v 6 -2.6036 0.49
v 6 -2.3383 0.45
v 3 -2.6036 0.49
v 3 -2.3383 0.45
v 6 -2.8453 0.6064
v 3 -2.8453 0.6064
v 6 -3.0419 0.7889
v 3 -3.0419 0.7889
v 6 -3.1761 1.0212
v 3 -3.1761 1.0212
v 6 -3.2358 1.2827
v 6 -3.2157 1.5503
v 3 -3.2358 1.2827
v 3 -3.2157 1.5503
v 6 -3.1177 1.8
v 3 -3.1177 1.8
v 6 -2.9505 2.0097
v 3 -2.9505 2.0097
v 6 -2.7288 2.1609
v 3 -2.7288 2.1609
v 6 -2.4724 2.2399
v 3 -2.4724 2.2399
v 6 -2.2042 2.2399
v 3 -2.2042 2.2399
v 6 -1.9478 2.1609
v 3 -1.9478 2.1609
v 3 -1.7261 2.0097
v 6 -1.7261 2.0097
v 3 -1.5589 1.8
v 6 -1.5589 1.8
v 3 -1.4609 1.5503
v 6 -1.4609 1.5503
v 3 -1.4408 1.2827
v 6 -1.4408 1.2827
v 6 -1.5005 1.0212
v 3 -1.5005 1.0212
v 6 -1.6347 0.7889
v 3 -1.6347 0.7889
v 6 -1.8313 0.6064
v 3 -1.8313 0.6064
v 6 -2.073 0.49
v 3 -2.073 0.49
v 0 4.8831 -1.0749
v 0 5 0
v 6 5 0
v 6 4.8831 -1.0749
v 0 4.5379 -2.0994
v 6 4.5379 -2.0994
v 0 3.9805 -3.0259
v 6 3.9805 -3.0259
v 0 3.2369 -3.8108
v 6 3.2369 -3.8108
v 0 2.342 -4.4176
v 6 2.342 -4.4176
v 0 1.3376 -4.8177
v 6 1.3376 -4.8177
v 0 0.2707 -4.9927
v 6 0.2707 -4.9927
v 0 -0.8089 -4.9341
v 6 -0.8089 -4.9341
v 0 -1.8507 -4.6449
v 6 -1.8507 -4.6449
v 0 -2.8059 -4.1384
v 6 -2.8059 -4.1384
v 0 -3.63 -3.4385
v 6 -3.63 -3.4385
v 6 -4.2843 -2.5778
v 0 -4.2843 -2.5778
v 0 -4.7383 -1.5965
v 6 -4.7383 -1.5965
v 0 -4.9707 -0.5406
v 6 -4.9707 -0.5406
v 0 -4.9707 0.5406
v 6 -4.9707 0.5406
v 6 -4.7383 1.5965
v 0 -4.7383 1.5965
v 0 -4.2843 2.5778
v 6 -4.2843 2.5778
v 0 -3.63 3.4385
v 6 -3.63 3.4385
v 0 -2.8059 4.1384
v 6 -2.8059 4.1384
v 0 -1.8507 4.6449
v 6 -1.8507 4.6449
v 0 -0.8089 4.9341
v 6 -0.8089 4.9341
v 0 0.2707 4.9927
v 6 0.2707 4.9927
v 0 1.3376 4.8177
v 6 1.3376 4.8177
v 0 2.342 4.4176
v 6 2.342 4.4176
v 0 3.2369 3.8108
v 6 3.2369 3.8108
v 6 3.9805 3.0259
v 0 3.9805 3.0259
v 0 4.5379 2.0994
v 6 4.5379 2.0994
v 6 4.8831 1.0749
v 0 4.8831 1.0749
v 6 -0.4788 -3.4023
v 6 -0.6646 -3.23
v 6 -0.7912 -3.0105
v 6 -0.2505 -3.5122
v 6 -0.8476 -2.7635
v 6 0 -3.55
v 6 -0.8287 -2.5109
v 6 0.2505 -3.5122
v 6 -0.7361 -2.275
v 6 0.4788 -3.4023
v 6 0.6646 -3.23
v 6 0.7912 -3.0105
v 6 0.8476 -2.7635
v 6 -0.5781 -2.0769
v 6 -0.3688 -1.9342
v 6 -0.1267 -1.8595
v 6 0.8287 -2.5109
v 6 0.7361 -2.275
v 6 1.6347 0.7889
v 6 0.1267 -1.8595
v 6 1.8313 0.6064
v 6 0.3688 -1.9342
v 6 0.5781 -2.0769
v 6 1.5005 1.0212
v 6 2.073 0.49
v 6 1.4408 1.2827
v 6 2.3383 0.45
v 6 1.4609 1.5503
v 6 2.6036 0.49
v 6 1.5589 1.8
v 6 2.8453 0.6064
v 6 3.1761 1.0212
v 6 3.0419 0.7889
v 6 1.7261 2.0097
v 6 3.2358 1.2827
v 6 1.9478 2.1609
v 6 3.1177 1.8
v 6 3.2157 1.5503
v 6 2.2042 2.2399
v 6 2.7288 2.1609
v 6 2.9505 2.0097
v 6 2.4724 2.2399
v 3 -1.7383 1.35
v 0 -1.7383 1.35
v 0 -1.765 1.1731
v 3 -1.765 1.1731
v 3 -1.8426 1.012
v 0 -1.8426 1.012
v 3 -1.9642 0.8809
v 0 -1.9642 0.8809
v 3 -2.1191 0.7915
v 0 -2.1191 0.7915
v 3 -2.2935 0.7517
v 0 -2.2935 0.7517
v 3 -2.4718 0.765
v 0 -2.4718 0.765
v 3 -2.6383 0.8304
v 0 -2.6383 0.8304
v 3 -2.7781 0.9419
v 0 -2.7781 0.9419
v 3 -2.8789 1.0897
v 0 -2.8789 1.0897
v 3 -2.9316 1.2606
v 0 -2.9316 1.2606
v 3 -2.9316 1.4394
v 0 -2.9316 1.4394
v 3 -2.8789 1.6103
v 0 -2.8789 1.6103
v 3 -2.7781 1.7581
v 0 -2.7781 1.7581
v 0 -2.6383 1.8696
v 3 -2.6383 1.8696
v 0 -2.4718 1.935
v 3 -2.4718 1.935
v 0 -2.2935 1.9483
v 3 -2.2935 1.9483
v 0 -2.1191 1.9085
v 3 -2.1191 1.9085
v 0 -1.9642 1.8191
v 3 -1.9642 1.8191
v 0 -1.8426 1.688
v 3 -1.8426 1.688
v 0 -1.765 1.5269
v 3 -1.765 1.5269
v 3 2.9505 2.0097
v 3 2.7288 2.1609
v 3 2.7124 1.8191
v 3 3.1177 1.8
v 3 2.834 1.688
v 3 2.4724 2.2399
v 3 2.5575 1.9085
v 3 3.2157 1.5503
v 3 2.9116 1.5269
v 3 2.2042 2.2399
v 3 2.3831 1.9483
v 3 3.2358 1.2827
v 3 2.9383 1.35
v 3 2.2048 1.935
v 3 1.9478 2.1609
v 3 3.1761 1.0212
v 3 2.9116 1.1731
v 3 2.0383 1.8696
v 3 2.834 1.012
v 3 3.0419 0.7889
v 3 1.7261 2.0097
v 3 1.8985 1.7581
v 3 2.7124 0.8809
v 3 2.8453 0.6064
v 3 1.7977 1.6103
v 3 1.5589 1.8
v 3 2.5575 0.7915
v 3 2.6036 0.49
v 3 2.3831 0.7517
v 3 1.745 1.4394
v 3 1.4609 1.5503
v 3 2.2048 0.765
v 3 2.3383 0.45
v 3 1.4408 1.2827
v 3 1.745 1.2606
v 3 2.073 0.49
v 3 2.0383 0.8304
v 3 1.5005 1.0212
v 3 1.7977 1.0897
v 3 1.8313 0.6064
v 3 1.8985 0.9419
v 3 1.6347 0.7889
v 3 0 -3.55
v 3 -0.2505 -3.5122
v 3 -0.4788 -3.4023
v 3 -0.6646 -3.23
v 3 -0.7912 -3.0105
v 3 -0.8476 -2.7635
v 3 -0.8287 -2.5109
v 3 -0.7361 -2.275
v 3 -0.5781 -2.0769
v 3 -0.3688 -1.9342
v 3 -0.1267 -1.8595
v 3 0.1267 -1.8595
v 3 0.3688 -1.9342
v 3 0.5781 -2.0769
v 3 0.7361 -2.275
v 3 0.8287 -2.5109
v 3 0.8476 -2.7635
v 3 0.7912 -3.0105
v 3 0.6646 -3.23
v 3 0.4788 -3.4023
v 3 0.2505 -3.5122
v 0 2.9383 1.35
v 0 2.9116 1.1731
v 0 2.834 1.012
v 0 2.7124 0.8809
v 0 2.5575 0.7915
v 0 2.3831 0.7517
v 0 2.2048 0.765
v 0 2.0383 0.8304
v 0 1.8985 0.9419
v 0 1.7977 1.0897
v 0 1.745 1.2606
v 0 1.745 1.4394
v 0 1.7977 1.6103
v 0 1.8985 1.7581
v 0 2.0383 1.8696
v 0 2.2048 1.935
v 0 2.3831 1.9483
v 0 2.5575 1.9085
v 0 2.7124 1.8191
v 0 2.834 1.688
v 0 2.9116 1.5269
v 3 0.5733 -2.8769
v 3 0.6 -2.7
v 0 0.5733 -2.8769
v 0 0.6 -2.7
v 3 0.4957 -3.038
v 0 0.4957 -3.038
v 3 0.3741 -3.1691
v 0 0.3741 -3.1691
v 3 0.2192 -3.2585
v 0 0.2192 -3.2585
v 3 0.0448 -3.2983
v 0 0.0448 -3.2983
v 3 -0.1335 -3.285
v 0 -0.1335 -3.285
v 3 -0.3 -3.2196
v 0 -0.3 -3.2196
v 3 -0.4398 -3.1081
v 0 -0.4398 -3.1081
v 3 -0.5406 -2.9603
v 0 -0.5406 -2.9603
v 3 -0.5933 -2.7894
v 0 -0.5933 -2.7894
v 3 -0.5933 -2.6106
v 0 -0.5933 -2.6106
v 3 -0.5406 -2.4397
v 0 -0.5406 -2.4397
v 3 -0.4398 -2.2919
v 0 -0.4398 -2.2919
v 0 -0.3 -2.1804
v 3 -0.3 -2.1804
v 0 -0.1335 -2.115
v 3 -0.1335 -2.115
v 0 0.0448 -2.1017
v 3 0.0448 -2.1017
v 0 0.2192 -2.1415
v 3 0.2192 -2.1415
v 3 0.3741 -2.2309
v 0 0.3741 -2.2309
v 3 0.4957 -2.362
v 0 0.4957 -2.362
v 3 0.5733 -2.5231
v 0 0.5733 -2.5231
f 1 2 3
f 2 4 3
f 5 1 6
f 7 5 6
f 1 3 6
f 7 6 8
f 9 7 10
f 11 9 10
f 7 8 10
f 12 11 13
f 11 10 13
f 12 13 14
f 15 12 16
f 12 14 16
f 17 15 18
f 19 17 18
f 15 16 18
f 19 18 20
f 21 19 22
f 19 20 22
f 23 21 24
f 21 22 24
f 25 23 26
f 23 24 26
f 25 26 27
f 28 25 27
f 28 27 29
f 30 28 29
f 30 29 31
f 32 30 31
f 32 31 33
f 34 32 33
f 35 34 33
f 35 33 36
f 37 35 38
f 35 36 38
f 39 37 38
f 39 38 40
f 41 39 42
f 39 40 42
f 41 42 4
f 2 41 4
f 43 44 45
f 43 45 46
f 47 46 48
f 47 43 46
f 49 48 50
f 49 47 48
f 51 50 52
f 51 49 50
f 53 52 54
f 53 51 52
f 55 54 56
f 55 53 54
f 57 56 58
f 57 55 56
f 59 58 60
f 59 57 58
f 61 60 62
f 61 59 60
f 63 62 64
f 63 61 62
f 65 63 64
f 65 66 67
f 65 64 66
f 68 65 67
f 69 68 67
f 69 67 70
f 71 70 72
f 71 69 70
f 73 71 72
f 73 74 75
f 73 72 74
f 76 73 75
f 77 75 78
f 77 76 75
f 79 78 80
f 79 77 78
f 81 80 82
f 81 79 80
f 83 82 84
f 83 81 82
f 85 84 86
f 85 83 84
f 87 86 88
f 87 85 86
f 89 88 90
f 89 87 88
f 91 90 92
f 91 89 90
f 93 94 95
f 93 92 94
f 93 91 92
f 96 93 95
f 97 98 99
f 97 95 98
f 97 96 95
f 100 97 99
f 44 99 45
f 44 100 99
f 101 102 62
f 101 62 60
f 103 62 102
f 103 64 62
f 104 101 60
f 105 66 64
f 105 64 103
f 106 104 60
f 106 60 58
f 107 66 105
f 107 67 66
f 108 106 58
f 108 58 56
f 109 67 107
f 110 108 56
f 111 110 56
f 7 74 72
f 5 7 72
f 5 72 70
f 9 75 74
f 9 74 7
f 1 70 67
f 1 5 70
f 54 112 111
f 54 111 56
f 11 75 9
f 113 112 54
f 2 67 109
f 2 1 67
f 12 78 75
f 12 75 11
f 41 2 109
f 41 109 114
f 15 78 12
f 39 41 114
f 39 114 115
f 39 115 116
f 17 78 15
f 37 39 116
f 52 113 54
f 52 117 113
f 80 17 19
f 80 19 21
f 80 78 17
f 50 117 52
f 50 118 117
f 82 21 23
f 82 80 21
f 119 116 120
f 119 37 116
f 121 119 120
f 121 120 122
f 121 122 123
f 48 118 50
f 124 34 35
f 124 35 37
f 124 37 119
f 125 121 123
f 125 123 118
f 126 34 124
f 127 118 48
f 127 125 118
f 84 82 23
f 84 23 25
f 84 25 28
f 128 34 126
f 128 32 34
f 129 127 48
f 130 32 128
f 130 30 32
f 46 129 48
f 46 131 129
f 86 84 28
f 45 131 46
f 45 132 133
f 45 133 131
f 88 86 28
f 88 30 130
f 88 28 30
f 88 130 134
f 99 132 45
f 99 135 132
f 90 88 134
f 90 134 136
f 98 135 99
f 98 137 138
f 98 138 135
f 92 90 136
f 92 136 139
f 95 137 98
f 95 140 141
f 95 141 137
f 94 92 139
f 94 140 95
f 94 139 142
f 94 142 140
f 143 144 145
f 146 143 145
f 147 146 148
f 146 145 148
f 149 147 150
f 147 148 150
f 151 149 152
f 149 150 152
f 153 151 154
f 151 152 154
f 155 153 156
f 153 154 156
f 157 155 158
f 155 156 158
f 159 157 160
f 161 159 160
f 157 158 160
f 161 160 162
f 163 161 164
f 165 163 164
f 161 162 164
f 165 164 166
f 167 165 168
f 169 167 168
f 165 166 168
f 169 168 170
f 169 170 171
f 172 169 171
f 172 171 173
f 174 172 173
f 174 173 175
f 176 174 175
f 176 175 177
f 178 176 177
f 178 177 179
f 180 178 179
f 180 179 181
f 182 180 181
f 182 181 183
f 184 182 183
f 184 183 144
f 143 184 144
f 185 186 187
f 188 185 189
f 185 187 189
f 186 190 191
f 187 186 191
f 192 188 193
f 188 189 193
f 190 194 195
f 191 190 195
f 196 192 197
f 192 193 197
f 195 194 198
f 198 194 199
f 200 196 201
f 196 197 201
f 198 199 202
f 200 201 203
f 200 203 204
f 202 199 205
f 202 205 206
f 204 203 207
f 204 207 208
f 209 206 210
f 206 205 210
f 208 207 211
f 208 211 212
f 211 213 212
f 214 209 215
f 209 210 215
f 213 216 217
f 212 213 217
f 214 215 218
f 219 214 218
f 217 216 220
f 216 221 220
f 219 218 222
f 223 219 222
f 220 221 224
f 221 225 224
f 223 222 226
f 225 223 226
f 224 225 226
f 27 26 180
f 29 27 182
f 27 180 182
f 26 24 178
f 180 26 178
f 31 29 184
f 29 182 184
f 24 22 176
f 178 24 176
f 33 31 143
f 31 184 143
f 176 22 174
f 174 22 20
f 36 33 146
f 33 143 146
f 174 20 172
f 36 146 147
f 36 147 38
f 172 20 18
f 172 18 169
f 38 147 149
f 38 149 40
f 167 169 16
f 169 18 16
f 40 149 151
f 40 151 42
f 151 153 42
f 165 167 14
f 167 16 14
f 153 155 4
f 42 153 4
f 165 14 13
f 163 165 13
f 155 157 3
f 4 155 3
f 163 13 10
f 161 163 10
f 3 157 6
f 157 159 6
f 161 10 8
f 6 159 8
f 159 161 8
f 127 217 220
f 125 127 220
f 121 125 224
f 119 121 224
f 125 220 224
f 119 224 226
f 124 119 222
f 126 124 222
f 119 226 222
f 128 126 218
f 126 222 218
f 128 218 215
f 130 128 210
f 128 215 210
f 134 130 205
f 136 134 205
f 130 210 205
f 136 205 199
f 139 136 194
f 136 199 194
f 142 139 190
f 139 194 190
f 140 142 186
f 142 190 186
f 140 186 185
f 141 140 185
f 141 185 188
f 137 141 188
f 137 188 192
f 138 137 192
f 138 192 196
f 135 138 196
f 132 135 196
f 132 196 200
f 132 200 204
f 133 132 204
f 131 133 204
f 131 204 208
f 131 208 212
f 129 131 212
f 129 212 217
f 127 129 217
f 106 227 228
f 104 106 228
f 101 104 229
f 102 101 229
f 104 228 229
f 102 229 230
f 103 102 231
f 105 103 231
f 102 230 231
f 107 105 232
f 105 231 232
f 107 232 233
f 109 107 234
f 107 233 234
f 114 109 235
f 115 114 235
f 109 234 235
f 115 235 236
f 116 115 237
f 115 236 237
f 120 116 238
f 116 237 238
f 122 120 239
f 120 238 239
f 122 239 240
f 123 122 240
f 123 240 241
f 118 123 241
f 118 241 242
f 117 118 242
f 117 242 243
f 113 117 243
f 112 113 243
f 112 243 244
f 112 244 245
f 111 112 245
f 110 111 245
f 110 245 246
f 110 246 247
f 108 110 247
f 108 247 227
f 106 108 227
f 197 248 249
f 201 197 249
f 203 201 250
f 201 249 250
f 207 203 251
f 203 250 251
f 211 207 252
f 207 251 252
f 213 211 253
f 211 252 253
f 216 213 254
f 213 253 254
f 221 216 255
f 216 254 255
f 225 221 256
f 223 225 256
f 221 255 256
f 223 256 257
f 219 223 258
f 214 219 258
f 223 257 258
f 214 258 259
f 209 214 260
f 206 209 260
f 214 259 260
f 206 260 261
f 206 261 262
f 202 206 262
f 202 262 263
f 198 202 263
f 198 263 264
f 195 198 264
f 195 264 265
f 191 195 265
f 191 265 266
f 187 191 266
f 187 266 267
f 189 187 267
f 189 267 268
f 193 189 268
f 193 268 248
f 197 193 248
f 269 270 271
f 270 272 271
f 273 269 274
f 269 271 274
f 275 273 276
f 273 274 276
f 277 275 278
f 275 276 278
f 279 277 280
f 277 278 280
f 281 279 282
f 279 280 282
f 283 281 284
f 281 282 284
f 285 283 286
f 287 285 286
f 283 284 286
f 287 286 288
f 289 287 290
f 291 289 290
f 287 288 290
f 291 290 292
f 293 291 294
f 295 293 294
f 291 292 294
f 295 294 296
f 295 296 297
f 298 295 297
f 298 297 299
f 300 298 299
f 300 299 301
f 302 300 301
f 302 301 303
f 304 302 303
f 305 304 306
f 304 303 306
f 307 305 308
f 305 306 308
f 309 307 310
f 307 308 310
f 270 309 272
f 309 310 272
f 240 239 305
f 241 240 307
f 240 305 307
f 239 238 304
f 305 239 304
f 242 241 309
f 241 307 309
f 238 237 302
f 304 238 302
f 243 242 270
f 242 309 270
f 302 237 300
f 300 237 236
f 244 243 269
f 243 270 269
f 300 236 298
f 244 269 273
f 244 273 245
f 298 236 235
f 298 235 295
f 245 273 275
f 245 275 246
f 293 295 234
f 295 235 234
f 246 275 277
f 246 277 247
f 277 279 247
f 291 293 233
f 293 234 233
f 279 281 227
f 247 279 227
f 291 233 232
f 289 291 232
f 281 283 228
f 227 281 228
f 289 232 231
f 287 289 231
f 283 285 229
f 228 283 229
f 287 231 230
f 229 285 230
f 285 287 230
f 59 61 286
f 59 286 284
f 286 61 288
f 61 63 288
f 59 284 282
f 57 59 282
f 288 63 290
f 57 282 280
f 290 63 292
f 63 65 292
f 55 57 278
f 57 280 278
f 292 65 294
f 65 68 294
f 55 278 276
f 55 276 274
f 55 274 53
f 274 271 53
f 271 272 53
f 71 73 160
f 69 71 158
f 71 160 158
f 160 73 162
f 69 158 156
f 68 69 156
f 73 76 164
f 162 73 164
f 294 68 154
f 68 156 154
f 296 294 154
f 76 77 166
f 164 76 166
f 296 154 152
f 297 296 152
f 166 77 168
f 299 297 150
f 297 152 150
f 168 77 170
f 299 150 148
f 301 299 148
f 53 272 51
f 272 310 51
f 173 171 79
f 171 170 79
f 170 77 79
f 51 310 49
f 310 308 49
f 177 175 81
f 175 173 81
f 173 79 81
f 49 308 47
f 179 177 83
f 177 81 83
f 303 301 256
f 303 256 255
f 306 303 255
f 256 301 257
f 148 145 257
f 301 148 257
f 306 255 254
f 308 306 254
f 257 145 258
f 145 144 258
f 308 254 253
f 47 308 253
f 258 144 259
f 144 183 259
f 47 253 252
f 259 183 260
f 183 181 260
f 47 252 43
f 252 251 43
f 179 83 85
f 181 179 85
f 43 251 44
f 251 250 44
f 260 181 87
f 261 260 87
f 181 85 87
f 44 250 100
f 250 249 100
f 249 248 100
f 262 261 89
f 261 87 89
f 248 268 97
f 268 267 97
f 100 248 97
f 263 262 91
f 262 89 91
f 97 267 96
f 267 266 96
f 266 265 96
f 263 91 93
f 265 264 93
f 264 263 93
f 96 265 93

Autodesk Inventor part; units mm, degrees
ref_plane "YZ Plane" through (0, 0, 0) normal (1, 0, 0) x (0, 1, 0)
ref_plane "XZ Plane" through (0, 0, 0) normal (0, 1, 0) x (-1, 0, 0)
ref_plane "XY Plane" through (0, 0, 0) normal (0, 0, 1) x (1, 0, 0)
sketch "Эскиз1" plane through (0, 0, 0) normal (1, 0, 0) x (0, 1, 0)
  circle A0 centre (0, 0) radius 5
  circle A1 centre (0, -2.7) radius 0.6
  circle A2 centre (0, 0) radius 2.7 construction
  circle A3 centre (-2.3383, 1.35) radius 0.6
  circle A4 centre (2.3383, 1.35) radius 0.6
  line L0 (0, 0) -> (5.4782, 3.1628) construction
  line L1 (0, 0) -> (-5.2011, 3.0029) construction
  line L2 (0, 0) -> (5.5612, 0) construction
  point P0 (2.3383, 1.35)
  dimension "d1" = 10
  dimension "d3" = 1.2
  dimension "d24" = 5.4
  dimension "d25" = 1.2
  dimension "d26" = 1.2
  dimension "d53" = 120
  dimension "d54" = 30
extrude "Выдавливание1" add sketch "Эскиз1" along normal blind 6 contours A0 | A3 | A4
sketch "Эскиз4" plane through (6, 0, 0) normal (1, 0, 0) x (0, 0, -1)
  circle A0 centre (2.7, 0) radius 0.6 projected
  point P0 (-1.35, 2.3383)
  point P1 (-1.35, 2.3383)
hole "Отверстие2" at (6, 0, -2.7) direction (-1, 0, 0) diameter 1.7 depth 3
extrude "Выдавливание2" cut sketch "Эскиз1" along normal blind 6 contours A3 | A4
sketch "Эскиз2" plane through (6, 0, 0) normal (1, 0, 0) x (0, 0, -1)
  point P0 (0, 0)
  point P1 (-1.35, 2.3383)
  point P2 (-1.35, 2.3383)
hole "Отверстие4" at (6, 2.3383, 1.35) direction (-1, 0, 0) diameter 1.8 depth 3
sketch "Эскиз3" plane through (6, 0, 0) normal (1, 0, 0) x (0, 0, -1)
  point P0 (0, 0)
  point P1 (-1.35, -2.3383)
  point P2 (-1.35, -2.3383)
hole "Отверстие5" at (6, -2.3383, 1.35) direction (-1, 0, 0) diameter 1.8 depth 3
equation "\"d1\" = inside"
equation "\"d3\" = 2 * pin_small_rad"
equation "\"d17\" = pin_big_dia"
equation "\"inside\" = 10"
equation "\"pin_small_rad\" = 0.6"
equation "\"pin_big_dia\" = 1.7"
properties part number "каркас" material "Пластмасса, непрозрачная, черная"
